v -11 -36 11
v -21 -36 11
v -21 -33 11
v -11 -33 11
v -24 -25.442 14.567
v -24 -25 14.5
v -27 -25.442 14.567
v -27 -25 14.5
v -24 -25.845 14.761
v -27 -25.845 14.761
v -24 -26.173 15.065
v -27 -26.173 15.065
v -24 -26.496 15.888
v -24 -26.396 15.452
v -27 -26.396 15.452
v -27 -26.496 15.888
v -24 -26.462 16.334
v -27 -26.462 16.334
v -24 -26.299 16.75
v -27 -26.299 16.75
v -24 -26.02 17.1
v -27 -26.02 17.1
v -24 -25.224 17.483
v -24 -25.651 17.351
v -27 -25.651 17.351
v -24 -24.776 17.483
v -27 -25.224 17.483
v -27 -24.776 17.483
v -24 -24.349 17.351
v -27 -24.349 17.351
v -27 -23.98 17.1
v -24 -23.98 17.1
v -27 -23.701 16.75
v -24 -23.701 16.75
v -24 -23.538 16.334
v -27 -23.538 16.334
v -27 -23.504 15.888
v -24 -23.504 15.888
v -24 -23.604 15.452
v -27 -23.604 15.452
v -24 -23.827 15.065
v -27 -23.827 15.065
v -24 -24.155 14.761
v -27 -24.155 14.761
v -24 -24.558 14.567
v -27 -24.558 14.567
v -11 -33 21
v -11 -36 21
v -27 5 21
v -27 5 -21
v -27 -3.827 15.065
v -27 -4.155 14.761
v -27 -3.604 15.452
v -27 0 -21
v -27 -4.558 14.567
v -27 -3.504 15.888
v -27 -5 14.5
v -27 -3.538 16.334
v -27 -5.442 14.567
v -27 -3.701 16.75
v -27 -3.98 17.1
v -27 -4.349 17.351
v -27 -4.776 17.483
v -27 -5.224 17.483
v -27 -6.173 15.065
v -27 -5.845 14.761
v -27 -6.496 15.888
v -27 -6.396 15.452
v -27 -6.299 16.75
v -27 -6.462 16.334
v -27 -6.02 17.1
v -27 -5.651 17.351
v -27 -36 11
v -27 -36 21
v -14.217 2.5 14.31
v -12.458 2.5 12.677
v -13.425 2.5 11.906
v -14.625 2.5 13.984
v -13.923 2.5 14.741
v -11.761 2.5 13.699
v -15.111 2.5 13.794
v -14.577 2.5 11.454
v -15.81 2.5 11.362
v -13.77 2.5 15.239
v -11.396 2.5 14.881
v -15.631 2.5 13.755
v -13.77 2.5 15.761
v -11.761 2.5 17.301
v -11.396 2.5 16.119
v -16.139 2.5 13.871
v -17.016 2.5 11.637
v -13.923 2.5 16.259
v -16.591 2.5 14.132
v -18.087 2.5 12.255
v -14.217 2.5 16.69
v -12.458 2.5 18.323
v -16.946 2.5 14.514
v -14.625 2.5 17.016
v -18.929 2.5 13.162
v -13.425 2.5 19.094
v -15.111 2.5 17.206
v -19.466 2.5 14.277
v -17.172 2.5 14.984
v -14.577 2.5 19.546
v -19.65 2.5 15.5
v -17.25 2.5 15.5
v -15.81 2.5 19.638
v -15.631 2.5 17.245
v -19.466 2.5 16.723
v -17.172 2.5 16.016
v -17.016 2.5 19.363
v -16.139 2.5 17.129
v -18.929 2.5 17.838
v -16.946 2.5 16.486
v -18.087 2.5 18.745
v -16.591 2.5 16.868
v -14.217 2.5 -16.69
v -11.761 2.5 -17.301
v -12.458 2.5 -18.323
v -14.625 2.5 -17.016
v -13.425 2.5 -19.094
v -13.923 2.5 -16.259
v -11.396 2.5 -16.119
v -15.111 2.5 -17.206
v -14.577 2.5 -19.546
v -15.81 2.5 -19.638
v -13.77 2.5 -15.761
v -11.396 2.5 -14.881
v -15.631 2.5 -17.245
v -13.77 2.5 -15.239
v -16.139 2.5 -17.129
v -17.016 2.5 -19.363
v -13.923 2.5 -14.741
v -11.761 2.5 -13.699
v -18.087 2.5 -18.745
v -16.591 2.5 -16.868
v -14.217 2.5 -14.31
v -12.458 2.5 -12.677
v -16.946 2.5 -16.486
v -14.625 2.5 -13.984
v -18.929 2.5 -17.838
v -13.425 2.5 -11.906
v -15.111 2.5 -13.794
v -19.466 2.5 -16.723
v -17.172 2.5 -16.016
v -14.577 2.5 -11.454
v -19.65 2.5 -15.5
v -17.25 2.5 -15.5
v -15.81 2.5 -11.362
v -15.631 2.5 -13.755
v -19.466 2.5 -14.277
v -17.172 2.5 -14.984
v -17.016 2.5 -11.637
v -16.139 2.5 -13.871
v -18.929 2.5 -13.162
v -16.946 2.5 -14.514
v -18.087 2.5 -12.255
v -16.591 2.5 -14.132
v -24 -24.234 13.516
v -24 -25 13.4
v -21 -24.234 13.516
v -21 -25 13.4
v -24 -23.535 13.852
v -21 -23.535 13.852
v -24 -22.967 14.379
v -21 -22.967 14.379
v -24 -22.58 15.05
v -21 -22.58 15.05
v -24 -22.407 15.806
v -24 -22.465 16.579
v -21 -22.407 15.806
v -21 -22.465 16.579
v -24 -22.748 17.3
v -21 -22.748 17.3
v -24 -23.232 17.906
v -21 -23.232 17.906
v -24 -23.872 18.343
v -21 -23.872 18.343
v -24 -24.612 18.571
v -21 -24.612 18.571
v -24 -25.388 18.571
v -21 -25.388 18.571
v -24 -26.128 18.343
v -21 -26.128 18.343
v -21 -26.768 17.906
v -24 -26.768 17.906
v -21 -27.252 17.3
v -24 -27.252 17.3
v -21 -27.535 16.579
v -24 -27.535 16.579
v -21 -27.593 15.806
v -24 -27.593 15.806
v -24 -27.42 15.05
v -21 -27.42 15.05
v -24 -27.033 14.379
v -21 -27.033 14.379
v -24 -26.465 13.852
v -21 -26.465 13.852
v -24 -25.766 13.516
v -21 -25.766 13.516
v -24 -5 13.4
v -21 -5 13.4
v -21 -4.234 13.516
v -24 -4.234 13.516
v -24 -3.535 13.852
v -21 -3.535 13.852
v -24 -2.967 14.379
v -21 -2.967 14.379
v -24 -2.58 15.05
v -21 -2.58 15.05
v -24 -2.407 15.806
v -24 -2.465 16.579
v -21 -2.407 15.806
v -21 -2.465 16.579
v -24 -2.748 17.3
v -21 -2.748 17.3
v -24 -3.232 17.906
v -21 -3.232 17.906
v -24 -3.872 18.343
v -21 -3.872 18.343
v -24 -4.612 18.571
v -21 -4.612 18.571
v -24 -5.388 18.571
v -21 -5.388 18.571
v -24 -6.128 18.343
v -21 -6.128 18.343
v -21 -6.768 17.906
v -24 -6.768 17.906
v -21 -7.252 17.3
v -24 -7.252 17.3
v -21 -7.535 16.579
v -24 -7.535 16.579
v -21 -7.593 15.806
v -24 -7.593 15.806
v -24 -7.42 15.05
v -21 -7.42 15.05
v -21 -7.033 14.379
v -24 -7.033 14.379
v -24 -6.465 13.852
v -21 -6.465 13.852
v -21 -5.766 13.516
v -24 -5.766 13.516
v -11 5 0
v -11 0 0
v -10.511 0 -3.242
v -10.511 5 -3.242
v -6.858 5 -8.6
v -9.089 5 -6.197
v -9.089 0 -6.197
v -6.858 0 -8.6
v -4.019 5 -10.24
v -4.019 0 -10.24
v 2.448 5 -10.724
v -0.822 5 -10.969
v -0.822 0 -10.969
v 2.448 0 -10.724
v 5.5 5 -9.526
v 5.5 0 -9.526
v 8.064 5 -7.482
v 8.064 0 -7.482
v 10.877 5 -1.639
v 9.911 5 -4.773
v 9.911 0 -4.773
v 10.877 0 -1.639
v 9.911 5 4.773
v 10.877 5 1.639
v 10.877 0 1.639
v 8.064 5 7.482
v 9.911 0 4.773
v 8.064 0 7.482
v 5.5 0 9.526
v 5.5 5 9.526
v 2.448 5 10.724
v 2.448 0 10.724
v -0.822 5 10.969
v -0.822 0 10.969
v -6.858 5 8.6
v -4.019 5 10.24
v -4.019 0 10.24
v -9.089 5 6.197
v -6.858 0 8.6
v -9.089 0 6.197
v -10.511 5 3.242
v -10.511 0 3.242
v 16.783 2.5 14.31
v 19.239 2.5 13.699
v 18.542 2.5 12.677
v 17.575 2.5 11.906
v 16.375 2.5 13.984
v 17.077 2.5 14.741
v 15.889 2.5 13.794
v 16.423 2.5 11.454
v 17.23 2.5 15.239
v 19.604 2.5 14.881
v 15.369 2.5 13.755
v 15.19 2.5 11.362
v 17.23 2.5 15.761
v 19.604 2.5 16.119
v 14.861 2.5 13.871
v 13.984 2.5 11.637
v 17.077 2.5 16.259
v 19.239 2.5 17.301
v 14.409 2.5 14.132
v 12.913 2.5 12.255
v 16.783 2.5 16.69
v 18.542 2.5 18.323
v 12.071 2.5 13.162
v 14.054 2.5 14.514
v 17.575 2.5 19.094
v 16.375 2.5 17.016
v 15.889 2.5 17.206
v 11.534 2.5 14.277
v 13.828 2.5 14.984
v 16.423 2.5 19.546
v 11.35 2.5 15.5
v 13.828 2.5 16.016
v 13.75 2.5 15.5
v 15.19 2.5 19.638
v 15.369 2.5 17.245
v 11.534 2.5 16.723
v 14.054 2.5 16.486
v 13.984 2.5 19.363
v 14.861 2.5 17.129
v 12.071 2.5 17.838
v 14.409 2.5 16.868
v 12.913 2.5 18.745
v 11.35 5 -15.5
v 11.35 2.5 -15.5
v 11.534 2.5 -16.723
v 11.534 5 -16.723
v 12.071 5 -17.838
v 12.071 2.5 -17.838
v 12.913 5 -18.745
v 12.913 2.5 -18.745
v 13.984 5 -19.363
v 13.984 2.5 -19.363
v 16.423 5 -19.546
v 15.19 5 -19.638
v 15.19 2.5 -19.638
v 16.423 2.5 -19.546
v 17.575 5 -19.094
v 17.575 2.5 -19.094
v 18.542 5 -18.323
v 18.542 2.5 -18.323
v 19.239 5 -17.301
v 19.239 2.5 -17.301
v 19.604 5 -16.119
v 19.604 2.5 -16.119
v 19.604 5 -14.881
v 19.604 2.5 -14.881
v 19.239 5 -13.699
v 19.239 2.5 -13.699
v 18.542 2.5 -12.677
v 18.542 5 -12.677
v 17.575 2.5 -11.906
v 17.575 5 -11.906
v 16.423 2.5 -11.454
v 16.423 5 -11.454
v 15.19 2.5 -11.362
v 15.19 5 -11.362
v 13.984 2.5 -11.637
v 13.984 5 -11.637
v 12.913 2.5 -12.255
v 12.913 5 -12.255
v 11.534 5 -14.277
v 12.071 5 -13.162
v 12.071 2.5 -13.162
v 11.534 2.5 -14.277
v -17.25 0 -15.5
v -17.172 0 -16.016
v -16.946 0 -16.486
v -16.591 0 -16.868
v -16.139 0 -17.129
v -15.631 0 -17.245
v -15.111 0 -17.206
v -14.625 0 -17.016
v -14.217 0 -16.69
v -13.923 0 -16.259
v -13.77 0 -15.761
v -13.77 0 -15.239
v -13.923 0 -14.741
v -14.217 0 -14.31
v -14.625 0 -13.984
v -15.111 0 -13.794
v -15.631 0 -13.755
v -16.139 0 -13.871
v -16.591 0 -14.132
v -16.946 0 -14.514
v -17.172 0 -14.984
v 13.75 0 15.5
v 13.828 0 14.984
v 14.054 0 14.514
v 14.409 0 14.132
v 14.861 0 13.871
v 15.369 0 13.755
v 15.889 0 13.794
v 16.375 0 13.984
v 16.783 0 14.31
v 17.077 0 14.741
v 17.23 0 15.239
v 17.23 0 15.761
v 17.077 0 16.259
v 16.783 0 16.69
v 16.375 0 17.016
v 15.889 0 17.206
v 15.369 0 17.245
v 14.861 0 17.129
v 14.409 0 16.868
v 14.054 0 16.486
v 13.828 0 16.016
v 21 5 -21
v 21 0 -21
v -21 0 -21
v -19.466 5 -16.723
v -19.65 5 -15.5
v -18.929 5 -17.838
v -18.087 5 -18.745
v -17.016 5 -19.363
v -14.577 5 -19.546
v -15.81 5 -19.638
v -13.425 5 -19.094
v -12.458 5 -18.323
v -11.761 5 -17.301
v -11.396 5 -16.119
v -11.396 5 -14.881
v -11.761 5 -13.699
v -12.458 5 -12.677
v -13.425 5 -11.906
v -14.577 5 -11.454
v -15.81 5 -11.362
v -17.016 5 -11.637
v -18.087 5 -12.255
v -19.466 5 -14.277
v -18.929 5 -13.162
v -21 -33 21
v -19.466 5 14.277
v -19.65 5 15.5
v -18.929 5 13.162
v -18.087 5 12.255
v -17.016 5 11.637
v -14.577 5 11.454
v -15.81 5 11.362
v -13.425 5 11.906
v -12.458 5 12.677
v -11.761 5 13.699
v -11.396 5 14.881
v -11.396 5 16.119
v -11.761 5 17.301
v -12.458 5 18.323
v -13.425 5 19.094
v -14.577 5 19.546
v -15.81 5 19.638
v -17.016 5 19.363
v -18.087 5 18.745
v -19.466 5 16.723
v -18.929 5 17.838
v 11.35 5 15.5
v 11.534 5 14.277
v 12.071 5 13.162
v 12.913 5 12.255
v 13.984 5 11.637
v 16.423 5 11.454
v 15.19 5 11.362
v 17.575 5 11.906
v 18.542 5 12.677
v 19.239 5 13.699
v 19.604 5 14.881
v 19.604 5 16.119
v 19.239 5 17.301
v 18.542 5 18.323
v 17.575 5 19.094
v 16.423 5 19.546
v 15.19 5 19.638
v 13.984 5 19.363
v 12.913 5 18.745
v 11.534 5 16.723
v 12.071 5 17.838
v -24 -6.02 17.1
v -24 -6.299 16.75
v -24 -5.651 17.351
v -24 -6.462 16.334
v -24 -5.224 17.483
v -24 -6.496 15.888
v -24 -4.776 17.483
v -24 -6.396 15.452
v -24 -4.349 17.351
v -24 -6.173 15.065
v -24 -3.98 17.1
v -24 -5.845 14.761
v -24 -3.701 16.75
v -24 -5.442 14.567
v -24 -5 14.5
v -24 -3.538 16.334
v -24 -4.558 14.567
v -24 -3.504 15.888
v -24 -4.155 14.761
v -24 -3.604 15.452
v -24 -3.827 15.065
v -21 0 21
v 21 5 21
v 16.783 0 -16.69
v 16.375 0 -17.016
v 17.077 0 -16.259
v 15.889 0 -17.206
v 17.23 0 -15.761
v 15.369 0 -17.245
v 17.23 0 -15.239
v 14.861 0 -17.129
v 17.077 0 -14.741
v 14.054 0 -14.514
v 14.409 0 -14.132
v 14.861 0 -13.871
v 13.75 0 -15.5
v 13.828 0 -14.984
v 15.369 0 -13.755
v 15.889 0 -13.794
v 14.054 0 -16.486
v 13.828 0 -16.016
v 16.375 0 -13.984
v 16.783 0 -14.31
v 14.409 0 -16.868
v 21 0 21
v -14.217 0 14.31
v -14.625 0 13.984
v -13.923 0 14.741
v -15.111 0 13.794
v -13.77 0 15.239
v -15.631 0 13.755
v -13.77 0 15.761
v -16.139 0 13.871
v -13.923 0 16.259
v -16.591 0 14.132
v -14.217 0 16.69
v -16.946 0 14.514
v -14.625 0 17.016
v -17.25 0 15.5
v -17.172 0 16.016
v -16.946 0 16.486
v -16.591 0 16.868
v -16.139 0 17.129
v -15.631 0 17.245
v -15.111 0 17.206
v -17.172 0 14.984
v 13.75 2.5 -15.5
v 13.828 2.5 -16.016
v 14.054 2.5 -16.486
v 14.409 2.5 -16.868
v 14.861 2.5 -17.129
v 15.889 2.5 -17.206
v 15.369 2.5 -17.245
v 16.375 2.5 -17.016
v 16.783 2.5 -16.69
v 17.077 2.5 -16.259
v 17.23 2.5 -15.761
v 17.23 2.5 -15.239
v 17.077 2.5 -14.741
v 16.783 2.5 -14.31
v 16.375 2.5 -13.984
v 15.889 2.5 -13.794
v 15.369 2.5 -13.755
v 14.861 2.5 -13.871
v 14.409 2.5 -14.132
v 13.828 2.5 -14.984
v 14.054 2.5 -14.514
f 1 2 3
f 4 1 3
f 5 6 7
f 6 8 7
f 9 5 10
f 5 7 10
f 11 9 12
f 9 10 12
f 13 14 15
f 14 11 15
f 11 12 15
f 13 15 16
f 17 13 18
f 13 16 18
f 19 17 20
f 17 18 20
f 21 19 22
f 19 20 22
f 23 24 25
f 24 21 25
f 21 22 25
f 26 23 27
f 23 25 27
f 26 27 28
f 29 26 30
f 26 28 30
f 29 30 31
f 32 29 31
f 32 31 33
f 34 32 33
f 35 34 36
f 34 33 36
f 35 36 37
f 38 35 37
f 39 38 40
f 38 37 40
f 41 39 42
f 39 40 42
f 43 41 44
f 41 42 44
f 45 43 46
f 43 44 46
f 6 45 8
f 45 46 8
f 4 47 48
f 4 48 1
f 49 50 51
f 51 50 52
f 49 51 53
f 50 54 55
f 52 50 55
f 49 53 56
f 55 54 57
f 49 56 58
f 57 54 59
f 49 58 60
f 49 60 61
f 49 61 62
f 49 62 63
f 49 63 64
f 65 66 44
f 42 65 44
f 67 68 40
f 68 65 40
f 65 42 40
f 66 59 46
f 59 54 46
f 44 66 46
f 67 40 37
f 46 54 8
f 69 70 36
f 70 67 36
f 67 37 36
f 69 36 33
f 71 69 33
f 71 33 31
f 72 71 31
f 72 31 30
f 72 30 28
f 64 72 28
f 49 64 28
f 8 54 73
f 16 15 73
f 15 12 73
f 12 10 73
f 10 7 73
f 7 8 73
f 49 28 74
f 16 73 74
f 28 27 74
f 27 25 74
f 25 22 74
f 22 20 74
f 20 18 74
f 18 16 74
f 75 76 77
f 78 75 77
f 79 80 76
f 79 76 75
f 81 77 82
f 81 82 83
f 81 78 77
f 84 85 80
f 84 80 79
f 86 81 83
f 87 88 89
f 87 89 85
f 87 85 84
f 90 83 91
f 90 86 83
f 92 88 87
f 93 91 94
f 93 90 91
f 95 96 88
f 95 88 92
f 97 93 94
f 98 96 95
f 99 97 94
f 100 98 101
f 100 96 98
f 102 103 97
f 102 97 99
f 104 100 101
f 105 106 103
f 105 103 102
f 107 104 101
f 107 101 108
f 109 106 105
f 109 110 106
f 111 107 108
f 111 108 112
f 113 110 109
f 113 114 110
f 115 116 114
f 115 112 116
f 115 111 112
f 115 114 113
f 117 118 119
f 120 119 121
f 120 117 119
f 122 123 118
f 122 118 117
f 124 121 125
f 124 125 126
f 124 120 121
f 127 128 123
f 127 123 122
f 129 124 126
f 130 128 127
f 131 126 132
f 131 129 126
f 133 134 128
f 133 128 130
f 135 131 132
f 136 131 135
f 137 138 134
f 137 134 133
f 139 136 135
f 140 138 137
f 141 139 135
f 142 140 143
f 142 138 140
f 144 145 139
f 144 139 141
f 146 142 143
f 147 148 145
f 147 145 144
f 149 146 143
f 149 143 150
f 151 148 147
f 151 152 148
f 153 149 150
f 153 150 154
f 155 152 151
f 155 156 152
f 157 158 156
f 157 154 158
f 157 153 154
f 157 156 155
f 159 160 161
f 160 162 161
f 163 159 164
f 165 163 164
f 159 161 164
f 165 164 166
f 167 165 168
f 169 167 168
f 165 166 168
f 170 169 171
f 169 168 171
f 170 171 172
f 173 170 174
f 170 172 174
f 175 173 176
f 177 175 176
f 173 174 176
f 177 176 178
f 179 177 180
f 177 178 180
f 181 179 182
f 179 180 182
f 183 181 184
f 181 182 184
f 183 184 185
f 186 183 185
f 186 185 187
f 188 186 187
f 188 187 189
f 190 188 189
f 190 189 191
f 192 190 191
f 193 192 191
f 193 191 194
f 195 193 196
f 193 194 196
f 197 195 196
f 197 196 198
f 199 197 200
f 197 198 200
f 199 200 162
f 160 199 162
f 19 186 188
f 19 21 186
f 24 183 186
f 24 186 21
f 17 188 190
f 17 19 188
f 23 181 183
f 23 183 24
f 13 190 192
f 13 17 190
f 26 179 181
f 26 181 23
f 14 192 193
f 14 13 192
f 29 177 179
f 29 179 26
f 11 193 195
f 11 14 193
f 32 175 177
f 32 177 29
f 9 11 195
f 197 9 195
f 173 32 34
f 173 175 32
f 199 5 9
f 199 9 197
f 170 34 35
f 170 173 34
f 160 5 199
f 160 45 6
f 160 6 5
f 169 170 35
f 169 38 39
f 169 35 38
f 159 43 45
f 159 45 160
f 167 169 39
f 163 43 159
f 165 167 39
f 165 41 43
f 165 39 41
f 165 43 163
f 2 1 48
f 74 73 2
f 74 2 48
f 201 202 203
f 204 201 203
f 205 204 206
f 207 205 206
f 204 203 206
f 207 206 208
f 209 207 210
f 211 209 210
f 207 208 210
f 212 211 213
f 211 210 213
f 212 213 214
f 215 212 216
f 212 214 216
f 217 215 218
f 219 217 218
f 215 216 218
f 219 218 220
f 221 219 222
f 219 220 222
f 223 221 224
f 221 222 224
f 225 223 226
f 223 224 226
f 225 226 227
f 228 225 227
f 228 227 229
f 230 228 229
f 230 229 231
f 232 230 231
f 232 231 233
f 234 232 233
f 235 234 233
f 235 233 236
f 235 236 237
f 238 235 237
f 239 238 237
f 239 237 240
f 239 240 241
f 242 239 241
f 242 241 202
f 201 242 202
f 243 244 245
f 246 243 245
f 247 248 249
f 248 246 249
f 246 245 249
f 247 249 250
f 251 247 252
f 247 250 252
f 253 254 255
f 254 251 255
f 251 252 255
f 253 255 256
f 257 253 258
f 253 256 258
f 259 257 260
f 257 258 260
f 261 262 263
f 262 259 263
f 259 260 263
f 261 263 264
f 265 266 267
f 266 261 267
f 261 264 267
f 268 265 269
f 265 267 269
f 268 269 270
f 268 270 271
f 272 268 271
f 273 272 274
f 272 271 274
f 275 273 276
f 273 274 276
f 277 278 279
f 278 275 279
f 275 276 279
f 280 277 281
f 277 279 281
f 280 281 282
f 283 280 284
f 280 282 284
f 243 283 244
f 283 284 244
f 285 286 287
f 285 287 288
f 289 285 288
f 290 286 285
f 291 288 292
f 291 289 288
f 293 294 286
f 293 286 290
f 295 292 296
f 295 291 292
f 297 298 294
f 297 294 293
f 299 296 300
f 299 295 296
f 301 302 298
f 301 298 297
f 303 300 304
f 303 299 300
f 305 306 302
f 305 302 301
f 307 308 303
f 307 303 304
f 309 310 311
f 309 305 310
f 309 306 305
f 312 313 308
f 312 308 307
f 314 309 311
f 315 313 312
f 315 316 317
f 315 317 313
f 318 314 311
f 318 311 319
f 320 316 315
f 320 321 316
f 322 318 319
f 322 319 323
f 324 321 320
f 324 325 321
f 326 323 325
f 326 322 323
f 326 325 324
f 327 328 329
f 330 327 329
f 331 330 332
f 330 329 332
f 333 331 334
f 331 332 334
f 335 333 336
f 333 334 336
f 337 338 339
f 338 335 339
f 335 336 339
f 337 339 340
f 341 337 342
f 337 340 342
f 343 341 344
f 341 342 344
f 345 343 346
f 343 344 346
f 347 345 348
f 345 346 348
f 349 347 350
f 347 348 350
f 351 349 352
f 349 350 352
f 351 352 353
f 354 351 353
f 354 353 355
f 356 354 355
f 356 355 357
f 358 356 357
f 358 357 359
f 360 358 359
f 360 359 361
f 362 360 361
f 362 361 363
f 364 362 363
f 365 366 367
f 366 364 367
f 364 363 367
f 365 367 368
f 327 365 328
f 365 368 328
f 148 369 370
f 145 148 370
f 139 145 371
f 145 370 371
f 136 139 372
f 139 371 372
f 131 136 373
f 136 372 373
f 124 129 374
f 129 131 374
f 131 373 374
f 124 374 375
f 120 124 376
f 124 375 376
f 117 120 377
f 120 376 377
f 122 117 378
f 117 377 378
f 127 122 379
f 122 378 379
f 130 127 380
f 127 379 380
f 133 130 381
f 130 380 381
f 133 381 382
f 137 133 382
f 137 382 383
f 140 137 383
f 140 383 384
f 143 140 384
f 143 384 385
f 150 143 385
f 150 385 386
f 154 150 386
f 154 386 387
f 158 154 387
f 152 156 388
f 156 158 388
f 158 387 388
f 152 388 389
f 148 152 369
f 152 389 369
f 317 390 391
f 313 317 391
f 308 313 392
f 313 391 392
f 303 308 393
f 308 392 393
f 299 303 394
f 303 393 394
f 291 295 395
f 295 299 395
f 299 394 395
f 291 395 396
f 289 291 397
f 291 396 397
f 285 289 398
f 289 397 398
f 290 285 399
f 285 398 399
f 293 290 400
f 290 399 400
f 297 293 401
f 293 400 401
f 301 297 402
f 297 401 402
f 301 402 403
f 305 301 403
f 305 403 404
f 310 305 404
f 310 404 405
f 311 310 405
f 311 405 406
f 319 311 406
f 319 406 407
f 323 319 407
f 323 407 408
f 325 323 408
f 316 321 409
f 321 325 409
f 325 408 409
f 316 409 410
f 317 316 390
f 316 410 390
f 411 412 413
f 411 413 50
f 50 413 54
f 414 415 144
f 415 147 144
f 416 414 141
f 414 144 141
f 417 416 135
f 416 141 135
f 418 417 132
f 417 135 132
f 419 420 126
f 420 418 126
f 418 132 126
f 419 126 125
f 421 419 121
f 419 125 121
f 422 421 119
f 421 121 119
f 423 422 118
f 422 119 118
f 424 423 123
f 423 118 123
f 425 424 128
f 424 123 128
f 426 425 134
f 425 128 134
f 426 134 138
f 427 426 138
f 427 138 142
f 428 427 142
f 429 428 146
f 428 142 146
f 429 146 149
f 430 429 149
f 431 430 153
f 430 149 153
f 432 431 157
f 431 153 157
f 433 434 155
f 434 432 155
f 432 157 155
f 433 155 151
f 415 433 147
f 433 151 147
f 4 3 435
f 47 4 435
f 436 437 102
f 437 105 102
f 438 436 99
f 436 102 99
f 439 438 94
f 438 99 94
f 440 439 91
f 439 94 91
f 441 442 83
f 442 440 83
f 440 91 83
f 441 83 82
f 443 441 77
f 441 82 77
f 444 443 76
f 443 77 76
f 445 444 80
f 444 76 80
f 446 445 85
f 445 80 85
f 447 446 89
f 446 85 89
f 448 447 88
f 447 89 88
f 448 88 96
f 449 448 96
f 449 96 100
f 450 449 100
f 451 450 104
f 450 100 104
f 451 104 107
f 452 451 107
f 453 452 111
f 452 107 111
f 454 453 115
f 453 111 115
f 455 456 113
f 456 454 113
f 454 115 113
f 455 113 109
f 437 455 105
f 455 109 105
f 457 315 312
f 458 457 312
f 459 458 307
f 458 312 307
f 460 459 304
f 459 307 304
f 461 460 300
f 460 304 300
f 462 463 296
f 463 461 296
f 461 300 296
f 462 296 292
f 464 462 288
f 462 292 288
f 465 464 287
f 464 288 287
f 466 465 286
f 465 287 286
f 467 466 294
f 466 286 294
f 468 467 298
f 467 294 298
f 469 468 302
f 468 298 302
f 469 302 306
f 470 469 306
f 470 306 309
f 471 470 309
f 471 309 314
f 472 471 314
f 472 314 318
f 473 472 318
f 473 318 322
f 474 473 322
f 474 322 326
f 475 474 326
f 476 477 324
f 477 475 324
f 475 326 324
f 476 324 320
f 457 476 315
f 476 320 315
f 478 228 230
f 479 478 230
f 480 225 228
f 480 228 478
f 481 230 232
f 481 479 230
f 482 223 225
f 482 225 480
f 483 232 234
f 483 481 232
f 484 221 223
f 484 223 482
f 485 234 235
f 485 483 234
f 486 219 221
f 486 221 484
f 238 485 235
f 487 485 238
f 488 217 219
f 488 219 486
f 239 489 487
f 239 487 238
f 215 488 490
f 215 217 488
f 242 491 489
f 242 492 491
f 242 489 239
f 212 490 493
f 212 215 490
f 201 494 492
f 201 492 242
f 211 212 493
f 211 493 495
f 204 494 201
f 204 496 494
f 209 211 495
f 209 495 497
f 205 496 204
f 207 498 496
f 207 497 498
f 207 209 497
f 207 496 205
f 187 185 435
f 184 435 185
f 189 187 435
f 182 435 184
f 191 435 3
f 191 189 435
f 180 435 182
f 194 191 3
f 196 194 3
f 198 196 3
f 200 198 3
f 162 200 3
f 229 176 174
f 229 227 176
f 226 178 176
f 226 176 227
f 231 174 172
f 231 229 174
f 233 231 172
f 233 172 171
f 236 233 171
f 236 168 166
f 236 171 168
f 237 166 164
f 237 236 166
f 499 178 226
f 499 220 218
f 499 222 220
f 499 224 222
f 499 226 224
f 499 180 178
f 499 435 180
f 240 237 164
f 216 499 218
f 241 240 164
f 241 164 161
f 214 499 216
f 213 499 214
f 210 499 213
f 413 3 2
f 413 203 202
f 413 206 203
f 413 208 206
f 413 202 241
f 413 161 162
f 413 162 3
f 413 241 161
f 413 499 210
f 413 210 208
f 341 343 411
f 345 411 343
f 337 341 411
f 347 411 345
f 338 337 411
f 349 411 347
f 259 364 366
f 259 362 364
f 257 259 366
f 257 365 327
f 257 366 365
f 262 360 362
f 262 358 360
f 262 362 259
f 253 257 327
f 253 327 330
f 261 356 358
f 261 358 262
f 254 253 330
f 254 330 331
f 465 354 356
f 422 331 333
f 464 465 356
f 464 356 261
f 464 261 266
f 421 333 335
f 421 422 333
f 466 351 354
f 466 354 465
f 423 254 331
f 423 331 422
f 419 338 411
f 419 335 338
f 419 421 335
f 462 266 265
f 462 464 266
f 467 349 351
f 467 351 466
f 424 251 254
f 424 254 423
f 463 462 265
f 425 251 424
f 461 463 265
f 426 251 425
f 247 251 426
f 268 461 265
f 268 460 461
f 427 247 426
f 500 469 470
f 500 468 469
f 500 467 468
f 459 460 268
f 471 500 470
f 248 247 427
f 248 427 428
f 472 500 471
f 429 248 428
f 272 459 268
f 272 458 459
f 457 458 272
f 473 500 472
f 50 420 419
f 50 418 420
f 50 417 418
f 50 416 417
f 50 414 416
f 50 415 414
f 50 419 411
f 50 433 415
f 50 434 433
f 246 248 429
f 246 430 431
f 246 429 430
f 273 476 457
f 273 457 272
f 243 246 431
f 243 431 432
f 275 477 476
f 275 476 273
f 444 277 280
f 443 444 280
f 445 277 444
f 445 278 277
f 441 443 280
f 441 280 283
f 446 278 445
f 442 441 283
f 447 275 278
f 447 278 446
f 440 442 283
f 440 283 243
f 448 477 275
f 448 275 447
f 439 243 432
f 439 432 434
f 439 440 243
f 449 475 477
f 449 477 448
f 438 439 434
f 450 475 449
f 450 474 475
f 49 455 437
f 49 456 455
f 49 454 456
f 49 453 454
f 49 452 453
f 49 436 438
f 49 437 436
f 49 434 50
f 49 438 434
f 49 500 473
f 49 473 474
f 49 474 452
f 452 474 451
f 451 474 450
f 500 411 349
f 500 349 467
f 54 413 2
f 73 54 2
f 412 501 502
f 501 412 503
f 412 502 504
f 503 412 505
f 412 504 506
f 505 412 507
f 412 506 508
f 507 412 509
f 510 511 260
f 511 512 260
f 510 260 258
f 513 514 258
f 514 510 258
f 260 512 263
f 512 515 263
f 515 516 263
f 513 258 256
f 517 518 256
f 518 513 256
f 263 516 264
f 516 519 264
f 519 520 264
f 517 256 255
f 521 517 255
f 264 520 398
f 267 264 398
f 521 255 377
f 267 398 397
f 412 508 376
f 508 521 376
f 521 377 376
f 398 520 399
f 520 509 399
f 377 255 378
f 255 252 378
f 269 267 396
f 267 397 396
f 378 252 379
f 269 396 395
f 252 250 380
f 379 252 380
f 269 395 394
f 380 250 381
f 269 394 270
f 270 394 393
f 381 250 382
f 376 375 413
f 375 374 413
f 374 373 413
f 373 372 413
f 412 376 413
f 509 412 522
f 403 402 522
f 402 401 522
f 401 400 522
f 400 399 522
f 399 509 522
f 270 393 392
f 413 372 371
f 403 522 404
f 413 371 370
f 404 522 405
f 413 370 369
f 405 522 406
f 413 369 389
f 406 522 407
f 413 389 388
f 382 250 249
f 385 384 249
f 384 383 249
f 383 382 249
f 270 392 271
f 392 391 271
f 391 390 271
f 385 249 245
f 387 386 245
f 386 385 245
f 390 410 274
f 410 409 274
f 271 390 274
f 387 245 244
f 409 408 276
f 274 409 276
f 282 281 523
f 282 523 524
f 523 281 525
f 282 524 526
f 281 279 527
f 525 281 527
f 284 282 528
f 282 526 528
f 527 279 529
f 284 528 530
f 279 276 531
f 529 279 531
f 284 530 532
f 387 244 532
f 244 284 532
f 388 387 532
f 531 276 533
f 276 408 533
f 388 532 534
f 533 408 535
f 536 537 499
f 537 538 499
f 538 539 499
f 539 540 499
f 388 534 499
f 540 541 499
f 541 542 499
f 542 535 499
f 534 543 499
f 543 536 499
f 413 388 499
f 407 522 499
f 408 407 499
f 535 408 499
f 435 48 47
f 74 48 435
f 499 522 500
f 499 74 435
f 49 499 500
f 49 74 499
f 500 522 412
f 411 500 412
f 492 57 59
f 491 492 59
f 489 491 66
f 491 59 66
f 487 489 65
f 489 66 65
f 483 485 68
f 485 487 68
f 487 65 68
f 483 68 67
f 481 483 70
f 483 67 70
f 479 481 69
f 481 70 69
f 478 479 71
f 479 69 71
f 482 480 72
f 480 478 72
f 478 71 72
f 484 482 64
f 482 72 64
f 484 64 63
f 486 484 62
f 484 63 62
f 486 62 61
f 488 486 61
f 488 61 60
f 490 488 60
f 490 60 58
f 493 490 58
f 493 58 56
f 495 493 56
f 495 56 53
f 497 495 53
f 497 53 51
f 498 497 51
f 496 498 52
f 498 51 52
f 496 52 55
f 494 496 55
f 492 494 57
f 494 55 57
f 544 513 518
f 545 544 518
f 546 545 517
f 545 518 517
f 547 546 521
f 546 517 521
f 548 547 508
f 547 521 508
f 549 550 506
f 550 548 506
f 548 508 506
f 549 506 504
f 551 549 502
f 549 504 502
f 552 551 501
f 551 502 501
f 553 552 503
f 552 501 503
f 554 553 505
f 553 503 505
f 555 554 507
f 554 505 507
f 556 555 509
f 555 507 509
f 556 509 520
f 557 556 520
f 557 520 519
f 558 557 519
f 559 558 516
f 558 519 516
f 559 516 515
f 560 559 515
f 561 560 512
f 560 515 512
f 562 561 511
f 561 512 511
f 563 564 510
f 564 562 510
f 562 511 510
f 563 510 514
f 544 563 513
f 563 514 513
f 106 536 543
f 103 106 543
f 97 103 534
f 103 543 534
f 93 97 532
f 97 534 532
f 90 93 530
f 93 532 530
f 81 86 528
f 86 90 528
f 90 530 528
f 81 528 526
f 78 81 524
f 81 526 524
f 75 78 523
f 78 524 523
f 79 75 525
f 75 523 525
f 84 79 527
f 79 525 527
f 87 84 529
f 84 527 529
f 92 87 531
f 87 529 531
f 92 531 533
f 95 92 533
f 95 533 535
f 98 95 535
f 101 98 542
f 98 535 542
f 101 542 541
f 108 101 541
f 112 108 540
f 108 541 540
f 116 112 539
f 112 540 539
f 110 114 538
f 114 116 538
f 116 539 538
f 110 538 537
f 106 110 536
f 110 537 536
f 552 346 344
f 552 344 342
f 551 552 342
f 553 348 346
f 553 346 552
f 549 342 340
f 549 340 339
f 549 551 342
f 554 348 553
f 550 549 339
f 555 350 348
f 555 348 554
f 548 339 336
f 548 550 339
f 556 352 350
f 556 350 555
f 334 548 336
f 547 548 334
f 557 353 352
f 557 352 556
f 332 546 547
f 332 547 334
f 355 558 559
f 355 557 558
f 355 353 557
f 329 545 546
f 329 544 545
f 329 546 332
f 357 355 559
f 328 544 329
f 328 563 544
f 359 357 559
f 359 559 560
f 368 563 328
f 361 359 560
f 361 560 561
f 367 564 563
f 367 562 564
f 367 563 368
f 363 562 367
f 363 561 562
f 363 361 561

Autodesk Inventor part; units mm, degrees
ref_plane "YZ Plane" through (0, 0, 0) normal (1, 0, 0) x (0, 1, 0)
ref_plane "XZ Plane" through (0, 0, 0) normal (0, 1, 0) x (-1, 0, 0)
ref_plane "XY Plane" through (0, 0, 0) normal (0, 0, 1) x (1, 0, 0)
sketch "Sketch1" plane through (0, 0, 0) normal (0, 1, 0) x (-1, 0, 0)
  line L0 (-21, -21) -> (21, -21)
  line L1 (21, -21) -> (21, 21)
  line L2 (21, 21) -> (-21, 21)
  line L3 (-21, 21) -> (-21, -21)
  line L4 (-21, -21) -> (21, 21) construction
  line L5 (21, -21) -> (-21, 21) construction
  circle A0 centre (15.5, 15.5) radius 1.75
  circle A1 centre (15.5, -15.5) radius 1.75
  circle A2 centre (-15.5, -15.5) radius 1.75
  circle A3 centre (-15.5, 15.5) radius 1.75
  circle A4 centre (0, 0) radius 11
  circle A5 centre (0, 0) radius 4 construction
  line L6 (21, -17) -> (17, -21)
  line L7 (21, 17) -> (17, 21)
  line L8 (-17, -21) -> (-21, -17)
  line L9 (-21, 17) -> (-17, 21)
  circle A6 centre (0, 0) radius 2.5 construction
  circle A7 centre (44, -10) radius 4 construction
  line L10 (44, -10) -> (44, 10) construction
  circle A8 centre (44, -10) radius 7.5 construction
  circle A9 centre (44, 10) radius 11.15 construction
  circle A10 centre (44, 10) radius 3.5 construction
  circle A11 centre (52, 10) radius 1.5 construction
  line L11 (52, 10) -> (44, 10) construction
  circle A12 centre (44, 18) radius 1.5 construction
  circle A13 centre (36, 10) radius 1.5 construction
  circle A14 centre (44, 2) radius 1.5 construction
  circle A15 centre (44, 10) radius 5.1 construction
  line L12 (44, 0) -> (21, 0) construction
  circle A16 centre (-15.5, -15.5) radius 4.15
  circle A17 centre (-15.5, 15.5) radius 4.15
  circle A18 centre (15.5, -15.5) radius 4.15
  circle A19 centre (15.5, 15.5) radius 4.15
  line L13 (21, -21) -> (24, -21)
  line L14 (21, 21) -> (21, -21)
  line L15 (27, -21) -> (27, 21)
  line L16 (24, -21) -> (27, -21)
  line L17 (21, 21) -> (27, 21)
  dimension "d0" = 42
  dimension "d1" = 31
  dimension "d2" = 31
  dimension "d3" = 31
  dimension "d4" = 31
  dimension "d5" = 3.5
  dimension "d6" = 3.5
  dimension "d7" = 3.5
  dimension "d8" = 3.5
  dimension "d9" = 22
  dimension "d10" = 8
  dimension "d11" = 4
  dimension "d12" = 4
  dimension "d13" = 4
  dimension "d14" = 4
  dimension "d15" = 4
  dimension "d16" = 4
  dimension "d17" = 4
  dimension "d18" = 5
  dimension "d21" = 8
  dimension "d23" = 20
  dimension "d24" = 15
  dimension "d28" = 22.3
  dimension "d29" = 7
  dimension "d30" = 3
  dimension "d31" = 8
  dimension "d32" = 360
  dimension "d33" = 10.2
  dimension "d36" = 2.4
  dimension "d38" = 2.4
  dimension "d39" = 2.4
  dimension "d40" = 2.4
  dimension "d46" = 17
  dimension "d47" = 6
extrude "Extrusion1" add sketch "Sketch1" along normal blind 5 contours L3 L8 L0 | L8 L3 L9 L2 L7 L1 L6 L0 | L6 L1 L0 | L3 L2 L9 | L1 L17 L15 L16 L13 | L7 L2 L1
extrude "Extrusion2" add sketch "Sketch1" along normal blind 2.5 contours A16 | A17 | A18 | A19
ref_plane "Work Plane1" through (-21, -30, 21) normal (1, 0, 0) x (0, 0, -1)
sketch "Sketch2" plane through (-21, -30, 21) normal (1, 0, 0) x (0, 0, -1)
  line L0 (42, 30) -> (42, -6)
  line L1 (20, 30) -> (20, -6) construction
  circle A0 centre (5, 25) radius 2.6
  circle A1 centre (5, 25) radius 1.5
  circle A2 centre (5, 5) radius 2.6
  circle A3 centre (5, 5) radius 1.5
  line L2 (0, 30) -> (0, 35) projected
  line L3 (0, 30) -> (42, 30) projected
  line L4 (0, 30) -> (42, 30)
  line L5 (42, 30) -> (42, -6)
  line L6 (42, -6) -> (0, -6)
  line L7 (0, -6) -> (0, 30)
  line L8 (42, 30) -> (42, 35) projected
  line L9 (42, 30) -> (20, -6) construction
  line L10 (20, 0) -> (0, 0) construction
  line L11 (0, -6) -> (10, -6)
  line L12 (10, -6) -> (10, -3)
  line L13 (10, -3) -> (0, -3)
  line L14 (0, -3) -> (0, -6)
  line L15 (18, 3) -> (24, 3) construction
  line L16 (24, 3) -> (24, -3) construction
  line L17 (24, -3) -> (18, -3) construction
  line L18 (18, -3) -> (18, 3) construction
  line L19 (42, 30) -> (10, -6)
  point P0 (21, 30)
  point P1 (0, -4.5)
  point P2 (0, -3)
  point P3 (10, -6)
  point P4 (10, -6)
  dimension "d51" = 5.2
  dimension "d52" = 3
  dimension "d59" = 5.2
  dimension "d60" = 3
  dimension "d64" = 5
  dimension "d66" = 5
  dimension "d67" = 20
  dimension "d68" = 25
  dimension "d69" = 20
  dimension "d70" = 36
  dimension "d71" = 30
  dimension "d72" = 10
  dimension "d73" = 3
  dimension "d76" = 18
  dimension "d77" = 6
  dimension "d78" = 6
  dimension "d79" = 3
extrude "Extrusion4" add sketch "Sketch2" against normal up to surface (6 mm away) contours L19 L12 L13 L7 L3 | L6 L7 L13 L12
extrude "Extrusion5" add sketch "Sketch2" along normal blind 3 from surface at -6 contours A0 | A2
extrude "Extrusion6" add sketch "Sketch2" along normal blind 10 contours L6 L7 L13 L12
equation "\"d2\" = d1"
equation "\"d3\" = d1"
equation "\"d4\" = d1"
equation "\"d6\" = d5"
equation "\"d7\" = d5"
equation "\"d8\" = d5"
equation "\"d12\" = d11"
equation "\"d13\" = d11"
equation "\"d14\" = d11"
equation "\"d15\" = d11"
equation "\"d16\" = d11"
equation "\"d17\" = d11"
properties part number "CoreXY Stepper Holder"
